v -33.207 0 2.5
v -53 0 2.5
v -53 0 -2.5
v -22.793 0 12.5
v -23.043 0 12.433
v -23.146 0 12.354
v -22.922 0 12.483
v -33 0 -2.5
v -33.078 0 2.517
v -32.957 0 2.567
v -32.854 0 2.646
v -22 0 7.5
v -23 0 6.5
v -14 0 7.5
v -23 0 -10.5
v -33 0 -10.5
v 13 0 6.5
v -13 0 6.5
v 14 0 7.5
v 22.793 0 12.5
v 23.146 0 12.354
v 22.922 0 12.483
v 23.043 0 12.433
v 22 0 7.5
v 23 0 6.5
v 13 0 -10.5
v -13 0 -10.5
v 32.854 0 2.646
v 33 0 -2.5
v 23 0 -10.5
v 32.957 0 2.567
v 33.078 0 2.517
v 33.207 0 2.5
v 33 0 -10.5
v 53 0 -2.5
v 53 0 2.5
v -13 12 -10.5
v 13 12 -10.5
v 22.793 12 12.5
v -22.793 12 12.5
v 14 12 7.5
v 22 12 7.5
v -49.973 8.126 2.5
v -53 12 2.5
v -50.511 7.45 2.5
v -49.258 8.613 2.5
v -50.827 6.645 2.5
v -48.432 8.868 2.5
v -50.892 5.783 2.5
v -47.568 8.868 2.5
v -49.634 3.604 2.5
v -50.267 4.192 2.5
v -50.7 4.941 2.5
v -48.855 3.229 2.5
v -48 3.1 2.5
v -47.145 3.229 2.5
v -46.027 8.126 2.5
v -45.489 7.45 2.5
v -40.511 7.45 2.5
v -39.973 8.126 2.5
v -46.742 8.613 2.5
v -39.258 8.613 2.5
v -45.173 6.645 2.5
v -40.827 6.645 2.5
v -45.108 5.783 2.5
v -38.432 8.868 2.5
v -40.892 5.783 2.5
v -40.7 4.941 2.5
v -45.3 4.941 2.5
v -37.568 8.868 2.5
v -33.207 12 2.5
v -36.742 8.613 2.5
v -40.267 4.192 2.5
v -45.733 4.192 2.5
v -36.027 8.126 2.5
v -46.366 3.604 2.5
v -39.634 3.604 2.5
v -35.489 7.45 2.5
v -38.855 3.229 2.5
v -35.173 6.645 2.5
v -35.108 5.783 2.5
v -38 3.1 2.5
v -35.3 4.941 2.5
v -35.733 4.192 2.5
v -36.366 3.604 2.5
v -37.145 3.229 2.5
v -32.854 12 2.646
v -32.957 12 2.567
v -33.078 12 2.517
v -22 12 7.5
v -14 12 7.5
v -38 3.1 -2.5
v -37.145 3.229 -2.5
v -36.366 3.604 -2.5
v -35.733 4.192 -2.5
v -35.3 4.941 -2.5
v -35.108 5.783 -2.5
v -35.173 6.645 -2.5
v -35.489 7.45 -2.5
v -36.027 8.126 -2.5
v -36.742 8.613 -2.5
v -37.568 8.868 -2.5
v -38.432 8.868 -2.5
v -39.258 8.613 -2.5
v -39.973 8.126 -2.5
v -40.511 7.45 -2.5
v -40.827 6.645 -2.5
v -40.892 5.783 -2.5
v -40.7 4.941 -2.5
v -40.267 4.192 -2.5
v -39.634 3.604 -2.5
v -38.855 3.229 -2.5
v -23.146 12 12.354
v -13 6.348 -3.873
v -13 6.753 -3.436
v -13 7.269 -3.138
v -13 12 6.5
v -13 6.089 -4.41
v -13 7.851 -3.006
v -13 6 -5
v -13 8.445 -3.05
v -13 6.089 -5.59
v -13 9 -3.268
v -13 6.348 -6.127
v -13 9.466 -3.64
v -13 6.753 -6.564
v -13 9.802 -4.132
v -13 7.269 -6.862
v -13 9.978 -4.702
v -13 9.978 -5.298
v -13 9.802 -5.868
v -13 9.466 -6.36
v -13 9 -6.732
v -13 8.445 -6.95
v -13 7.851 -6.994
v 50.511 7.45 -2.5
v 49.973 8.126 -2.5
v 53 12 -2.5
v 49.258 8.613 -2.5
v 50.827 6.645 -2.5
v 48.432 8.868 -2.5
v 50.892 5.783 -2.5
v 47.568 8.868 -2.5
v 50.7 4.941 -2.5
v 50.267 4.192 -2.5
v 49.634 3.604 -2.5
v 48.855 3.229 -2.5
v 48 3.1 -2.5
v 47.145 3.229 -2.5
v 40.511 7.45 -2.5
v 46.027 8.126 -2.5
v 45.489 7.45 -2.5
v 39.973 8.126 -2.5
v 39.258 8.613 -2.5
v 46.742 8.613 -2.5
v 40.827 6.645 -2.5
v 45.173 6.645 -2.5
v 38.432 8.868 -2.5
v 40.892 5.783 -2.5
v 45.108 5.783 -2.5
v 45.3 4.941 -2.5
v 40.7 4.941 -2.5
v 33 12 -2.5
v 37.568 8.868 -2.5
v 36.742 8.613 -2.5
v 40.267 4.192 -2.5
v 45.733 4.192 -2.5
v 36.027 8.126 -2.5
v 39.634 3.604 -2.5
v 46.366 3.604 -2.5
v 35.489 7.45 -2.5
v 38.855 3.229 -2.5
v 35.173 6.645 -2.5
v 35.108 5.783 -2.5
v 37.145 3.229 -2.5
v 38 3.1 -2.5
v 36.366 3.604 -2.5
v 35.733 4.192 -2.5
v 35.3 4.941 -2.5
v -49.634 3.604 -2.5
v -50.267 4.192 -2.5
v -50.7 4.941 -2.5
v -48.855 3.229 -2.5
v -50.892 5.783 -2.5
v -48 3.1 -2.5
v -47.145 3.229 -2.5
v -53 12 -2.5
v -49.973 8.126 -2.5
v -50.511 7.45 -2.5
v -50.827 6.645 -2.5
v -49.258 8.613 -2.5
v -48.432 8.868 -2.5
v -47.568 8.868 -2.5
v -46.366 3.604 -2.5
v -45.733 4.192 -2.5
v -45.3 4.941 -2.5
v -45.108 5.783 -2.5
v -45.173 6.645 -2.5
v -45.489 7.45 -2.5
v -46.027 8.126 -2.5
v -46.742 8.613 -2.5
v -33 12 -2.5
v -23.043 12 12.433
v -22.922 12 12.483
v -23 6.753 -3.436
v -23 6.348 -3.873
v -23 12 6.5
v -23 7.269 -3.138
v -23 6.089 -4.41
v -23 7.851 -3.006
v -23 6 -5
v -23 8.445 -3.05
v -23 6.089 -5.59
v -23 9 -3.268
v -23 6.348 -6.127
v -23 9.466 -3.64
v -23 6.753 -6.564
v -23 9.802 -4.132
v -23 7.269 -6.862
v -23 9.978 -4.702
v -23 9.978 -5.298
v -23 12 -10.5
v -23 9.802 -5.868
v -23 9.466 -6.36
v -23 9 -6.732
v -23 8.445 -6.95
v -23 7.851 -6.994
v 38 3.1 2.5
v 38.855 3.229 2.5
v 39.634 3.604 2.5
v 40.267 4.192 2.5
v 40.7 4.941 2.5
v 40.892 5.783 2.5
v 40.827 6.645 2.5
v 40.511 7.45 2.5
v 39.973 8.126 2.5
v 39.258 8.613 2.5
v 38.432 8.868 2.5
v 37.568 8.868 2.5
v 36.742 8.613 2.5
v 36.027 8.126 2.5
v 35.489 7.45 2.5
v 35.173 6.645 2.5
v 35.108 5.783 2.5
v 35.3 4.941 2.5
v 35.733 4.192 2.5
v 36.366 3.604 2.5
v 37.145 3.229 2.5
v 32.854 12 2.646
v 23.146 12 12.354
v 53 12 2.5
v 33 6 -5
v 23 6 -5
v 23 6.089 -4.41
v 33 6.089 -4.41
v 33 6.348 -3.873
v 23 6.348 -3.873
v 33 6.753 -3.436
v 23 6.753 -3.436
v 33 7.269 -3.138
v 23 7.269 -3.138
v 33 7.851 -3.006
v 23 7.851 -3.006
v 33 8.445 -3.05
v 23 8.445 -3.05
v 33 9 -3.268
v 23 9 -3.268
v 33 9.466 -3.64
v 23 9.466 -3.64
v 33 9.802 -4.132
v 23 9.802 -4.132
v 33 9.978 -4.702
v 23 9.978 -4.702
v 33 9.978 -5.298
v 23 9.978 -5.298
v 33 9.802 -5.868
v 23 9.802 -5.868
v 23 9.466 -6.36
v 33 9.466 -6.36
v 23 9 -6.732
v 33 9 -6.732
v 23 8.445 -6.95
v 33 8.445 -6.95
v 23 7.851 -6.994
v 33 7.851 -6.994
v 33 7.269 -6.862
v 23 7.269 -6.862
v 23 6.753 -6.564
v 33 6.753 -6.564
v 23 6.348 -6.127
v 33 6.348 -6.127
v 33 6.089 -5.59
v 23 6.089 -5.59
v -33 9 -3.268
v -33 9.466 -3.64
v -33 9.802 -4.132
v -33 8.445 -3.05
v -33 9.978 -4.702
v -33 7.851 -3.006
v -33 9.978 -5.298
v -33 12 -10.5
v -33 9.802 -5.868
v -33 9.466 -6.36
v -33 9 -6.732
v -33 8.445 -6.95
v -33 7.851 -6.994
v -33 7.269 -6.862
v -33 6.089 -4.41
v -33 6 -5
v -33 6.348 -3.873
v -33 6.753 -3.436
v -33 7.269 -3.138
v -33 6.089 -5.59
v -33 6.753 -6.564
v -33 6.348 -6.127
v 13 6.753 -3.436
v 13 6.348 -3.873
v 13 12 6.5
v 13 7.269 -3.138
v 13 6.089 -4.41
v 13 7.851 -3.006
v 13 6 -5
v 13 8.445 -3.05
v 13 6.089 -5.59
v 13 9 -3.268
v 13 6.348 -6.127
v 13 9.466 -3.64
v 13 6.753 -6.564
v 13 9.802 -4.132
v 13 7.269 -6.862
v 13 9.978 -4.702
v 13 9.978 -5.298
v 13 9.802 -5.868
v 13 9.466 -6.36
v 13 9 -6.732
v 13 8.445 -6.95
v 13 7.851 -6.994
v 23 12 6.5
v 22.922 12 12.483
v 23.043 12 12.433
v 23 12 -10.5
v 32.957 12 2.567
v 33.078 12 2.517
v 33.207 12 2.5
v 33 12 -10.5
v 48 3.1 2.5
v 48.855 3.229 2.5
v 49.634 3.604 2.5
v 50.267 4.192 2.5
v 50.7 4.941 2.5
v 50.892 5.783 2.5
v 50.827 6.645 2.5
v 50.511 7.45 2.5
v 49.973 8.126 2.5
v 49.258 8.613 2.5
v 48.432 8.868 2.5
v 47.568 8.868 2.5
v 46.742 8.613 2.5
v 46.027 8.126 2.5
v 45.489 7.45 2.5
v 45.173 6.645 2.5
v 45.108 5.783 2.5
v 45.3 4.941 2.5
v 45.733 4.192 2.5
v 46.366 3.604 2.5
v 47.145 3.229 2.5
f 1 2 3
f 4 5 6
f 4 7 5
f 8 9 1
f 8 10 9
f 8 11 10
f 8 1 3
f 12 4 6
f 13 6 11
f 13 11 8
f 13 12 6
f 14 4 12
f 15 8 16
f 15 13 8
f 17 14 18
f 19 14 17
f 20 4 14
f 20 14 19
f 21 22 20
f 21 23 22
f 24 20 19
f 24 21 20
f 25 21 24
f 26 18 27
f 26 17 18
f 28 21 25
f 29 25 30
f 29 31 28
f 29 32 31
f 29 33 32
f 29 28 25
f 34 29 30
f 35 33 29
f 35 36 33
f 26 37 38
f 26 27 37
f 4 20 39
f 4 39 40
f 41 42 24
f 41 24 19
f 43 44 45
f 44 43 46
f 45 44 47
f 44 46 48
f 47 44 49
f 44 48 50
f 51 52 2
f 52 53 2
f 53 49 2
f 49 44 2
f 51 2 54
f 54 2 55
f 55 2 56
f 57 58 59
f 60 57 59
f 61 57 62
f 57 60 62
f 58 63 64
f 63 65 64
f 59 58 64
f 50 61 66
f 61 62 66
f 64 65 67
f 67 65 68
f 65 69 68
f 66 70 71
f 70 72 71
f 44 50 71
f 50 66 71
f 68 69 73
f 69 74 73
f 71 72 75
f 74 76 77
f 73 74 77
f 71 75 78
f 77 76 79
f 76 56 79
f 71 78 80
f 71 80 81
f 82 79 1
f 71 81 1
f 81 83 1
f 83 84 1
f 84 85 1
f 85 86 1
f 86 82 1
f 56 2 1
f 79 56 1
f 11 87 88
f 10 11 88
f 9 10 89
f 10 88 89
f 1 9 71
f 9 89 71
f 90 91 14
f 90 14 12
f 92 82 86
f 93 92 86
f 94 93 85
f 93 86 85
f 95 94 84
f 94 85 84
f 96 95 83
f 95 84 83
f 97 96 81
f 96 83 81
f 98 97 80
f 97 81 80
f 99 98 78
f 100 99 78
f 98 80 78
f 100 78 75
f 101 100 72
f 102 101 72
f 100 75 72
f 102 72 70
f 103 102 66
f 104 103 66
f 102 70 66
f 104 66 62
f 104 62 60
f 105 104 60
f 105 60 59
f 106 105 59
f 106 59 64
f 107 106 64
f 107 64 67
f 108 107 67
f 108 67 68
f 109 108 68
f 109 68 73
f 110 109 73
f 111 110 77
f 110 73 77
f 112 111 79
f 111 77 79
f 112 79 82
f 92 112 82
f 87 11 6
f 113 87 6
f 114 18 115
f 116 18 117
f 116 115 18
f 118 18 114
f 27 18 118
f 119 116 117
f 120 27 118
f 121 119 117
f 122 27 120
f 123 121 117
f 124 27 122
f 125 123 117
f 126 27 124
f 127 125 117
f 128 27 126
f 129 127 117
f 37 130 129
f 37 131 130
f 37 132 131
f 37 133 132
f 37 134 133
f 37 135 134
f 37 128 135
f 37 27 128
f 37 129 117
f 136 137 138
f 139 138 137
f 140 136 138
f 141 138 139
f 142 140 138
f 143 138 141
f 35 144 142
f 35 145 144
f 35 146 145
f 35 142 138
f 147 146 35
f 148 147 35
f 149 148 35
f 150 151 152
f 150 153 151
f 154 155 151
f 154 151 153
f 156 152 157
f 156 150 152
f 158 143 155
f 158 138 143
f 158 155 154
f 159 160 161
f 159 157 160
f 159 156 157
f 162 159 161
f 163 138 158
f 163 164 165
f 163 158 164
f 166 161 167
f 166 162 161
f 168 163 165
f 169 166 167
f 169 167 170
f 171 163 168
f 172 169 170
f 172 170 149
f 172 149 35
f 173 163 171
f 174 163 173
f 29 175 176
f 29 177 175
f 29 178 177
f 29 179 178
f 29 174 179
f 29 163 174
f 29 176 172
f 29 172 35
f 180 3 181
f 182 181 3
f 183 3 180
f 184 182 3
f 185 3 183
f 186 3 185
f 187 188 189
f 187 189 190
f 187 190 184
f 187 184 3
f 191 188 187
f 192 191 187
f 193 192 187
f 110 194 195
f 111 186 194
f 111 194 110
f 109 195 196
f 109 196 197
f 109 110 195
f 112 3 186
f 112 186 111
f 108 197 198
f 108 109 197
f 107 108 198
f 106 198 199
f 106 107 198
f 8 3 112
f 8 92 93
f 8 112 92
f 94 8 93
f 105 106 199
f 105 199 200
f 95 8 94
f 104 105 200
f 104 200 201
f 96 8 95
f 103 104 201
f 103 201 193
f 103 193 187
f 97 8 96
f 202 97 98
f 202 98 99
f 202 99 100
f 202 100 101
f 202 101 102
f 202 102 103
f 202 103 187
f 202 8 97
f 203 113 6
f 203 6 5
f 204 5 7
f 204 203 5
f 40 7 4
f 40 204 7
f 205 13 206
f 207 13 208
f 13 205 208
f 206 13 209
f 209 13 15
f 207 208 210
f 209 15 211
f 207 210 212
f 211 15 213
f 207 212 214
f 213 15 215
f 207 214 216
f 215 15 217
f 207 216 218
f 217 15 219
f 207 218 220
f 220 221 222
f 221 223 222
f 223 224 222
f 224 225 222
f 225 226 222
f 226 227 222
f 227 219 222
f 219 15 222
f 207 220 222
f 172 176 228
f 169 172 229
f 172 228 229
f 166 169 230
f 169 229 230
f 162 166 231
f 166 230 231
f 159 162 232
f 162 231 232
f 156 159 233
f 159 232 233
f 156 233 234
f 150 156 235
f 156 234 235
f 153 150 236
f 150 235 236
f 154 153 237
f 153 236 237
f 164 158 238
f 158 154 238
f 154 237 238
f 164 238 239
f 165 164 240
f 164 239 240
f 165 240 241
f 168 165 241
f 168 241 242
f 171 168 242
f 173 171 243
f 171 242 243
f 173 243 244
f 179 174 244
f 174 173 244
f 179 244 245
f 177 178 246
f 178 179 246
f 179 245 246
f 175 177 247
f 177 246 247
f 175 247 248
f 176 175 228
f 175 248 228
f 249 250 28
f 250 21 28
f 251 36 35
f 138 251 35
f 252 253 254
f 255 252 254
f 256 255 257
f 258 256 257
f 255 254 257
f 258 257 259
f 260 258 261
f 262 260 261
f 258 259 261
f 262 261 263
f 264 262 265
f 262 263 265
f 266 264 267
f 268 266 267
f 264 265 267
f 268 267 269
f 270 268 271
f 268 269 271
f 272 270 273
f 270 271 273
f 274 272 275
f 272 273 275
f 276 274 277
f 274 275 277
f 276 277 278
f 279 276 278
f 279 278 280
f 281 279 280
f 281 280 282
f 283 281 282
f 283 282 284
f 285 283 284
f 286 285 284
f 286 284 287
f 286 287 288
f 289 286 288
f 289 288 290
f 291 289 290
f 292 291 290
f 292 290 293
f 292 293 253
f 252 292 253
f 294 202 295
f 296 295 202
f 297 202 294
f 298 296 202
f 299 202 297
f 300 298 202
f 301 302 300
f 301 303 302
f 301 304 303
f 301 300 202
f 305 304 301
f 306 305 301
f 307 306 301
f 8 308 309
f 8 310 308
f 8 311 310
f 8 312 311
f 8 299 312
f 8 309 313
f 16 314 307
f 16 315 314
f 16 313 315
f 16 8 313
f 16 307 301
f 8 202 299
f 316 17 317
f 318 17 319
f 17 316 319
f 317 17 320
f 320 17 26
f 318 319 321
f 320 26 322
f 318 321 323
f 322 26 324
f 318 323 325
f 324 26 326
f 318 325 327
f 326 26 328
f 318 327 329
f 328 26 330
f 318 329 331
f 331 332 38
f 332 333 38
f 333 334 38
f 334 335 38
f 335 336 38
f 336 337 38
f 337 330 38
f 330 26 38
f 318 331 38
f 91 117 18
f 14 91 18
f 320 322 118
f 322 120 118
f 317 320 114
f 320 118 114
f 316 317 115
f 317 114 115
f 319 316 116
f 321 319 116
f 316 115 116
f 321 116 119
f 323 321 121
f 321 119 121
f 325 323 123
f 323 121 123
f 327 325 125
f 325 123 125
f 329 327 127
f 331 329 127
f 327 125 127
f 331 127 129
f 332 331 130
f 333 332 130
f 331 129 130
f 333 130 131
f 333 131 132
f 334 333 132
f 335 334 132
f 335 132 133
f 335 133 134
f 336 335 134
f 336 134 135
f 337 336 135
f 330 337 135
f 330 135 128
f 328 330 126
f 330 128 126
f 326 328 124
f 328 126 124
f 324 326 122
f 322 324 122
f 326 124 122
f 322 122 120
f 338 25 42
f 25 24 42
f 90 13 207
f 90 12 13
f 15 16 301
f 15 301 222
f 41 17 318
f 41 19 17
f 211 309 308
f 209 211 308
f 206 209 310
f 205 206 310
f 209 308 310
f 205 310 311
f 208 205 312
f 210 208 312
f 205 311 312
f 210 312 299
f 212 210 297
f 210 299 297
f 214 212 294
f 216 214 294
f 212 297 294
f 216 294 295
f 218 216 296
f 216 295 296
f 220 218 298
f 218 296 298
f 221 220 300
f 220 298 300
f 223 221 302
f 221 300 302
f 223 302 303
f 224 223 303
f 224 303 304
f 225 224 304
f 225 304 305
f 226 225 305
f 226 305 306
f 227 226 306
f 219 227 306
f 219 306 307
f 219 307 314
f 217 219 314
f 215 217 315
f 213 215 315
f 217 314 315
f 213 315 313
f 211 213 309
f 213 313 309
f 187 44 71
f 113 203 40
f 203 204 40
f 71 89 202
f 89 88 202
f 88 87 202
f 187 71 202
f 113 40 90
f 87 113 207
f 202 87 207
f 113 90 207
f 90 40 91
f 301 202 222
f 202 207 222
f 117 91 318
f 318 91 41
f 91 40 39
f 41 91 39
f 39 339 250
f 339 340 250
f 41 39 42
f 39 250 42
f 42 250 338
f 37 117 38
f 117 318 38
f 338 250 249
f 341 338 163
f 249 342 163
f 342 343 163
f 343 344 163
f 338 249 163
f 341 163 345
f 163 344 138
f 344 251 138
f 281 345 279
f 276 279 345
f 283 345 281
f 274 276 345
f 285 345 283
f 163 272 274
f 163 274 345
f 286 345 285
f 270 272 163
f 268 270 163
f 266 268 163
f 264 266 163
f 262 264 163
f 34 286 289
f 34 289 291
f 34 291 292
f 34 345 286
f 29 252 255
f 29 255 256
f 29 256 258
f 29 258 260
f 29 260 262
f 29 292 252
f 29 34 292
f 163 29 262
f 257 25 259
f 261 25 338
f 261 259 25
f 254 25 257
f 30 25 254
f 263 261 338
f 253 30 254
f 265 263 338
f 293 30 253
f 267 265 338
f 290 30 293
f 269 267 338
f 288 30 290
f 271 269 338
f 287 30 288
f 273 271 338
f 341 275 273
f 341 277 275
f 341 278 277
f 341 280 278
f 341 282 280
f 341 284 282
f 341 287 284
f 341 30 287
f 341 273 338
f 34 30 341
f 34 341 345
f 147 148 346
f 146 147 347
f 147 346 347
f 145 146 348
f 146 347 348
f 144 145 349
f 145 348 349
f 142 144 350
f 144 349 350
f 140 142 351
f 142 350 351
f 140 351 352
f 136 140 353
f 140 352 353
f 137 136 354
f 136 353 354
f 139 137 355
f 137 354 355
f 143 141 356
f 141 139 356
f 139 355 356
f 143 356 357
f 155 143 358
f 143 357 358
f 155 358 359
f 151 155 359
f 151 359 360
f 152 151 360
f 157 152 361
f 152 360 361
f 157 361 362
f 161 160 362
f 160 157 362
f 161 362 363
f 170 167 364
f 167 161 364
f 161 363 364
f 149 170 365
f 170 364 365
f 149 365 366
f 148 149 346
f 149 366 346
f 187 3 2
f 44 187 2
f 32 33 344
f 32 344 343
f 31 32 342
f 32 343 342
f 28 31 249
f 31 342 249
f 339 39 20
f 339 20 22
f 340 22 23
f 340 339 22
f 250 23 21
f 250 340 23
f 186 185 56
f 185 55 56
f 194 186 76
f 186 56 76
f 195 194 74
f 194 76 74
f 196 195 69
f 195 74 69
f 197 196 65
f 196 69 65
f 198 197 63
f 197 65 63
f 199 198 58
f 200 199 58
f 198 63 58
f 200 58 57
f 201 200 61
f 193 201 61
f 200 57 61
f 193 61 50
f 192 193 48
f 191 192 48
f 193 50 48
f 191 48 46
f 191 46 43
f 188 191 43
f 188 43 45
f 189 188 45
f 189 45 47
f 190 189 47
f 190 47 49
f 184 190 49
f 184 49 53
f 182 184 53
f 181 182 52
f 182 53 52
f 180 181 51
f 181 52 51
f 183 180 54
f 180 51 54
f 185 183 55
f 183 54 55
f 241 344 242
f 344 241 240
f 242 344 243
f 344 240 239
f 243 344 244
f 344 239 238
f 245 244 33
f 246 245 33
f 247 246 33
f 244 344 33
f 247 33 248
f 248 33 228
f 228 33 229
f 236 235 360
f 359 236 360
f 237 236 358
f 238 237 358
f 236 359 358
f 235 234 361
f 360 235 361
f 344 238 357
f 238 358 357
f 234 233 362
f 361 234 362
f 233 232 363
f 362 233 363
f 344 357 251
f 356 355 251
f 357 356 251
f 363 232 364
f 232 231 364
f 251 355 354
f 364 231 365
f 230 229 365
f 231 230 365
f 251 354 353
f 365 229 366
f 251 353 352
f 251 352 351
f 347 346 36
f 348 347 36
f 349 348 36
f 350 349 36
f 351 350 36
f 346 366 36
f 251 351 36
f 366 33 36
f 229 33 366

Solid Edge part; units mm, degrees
sketch "Sketch1" plane through (0, 0, 0) normal (0, -1, 0) x (1, 0, 0)
  line L0 (-33, -12.5) -> (33, -12.5)
  line L1 (33, -12.5) -> (33, 12.5)
  line L2 (33, 12.5) -> (-33, 12.5)
  line L3 (-33, 12.5) -> (-33, -12.5)
  dimension "D1" = 66
  dimension "D2" = 25
extrude "Protrusion1" add sketch "Sketch1" against normal blind 12
sketch "Sketch2" plane through (0, 6, -12.5) normal (0, 0, -1) x (1, 0, 0)
  line L0 (-23, 6) -> (-23, -6)
  line L1 (-23, -6) -> (-13, -6)
  line L2 (-13, 6) -> (-13, -6)
  line L3 (-23, 6) -> (-13, 6)
  line L4 (13, 6) -> (13, -6)
  line L5 (13, -6) -> (23, -6)
  line L6 (23, 6) -> (23, -6)
  line L7 (13, 6) -> (23, 6)
  dimension "D1" = 10
  dimension "D2" = 10
  dimension "D3" = 10
  dimension "D4" = 46
extrude "Extrusionsausschnitt_1" cut sketch "Sketch2" against normal blind 20
sketch "Sketch3" plane through (-33, 6, 0) normal (-1, 0, 0) x (0, -1, 0)
  line L0 (-6, 12.5) -> (6, 12.5)
  line L1 (6, 12.5) -> (6, -2.5)
  line L2 (6, -2.5) -> (-6, -2.5)
  line L3 (-6, -2.5) -> (-6, 12.5)
  dimension "D1" = 10
extrude "Extrusionsausprägung_2" add sketch "Sketch3" along normal blind 20
mirror "Mirror1" about plane through (0, 0, 0) normal (1, 0, 0) of "Extrusionsausprägung_2"
sketch "Sketch4" plane through (-33, 6, -3) normal (-1, 0, 0) x (0, -1, 0)
  circle A0 centre (-2, -2) radius 2
  dimension "D1" = 4
  dimension "D2" = 2.5
  dimension "D3" = 4
extrude "Extrusionsausschnitt_2" cut sketch "Sketch4" against normal blind 113.0381
sketch "Sketch5" plane through (0, 0, 0) normal (0, -1, 0) x (1, 0, 0)
  line L0 (-33, -10.5) -> (33, -10.5)
  dimension "D1" = 8
extrude "Extrusionsausschnitt_3" cut sketch "Sketch5" against normal blind 62.4108 material side at (0, 0, -10.55)
sketch "Sketch6" plane through (0, 0, 1) normal (0, -1, 0) x (1, 0, 0)
  line L0 (-53, 1.5) -> (-33, 1.5)
  line L1 (-33, 1.5) -> (-23, 11.5)
  dimension "D1" = 20
  dimension "D2" = 5
extrude "Extrusionsausschnitt_4" cut sketch "Sketch6" against normal blind 64.7066 material side at (-43, 0, 2.55)
hole "Bohrung_1" at (-48, 6, 2.5) direction (0, 0, -1) diameter 5.8 end up to next
hole "Hole1" at (-38, 6, 2.5) direction (0, 0, -1) diameter 5.8 end up to next
fillet "Verrundung_1" radius 0.5 2 edges at (-33, 6, 2.5) (-23, 6, 12.5)
chamfer "Fase_1" distance 1 angle 45 4 edges at (-23, 6, 7.5) (-13, 6, 7.5) (13, 6, 7.5) (23, 6, 7.5)
mirror "Mirror2" about plane through (0, 0, 0) normal (1, 0, 0) of "Extrusionsausschnitt_4", "Bohrung_1", "Hole1"
fillet "Round1" radius 0.5 2 edges at (33, 6, 2.5) (23, 6, 12.5)
chamfer "Chamfer1" [suppressed]
properties material "Aluminiumlegierung:3.0205, Al 99.0, EN-AW 1200"
